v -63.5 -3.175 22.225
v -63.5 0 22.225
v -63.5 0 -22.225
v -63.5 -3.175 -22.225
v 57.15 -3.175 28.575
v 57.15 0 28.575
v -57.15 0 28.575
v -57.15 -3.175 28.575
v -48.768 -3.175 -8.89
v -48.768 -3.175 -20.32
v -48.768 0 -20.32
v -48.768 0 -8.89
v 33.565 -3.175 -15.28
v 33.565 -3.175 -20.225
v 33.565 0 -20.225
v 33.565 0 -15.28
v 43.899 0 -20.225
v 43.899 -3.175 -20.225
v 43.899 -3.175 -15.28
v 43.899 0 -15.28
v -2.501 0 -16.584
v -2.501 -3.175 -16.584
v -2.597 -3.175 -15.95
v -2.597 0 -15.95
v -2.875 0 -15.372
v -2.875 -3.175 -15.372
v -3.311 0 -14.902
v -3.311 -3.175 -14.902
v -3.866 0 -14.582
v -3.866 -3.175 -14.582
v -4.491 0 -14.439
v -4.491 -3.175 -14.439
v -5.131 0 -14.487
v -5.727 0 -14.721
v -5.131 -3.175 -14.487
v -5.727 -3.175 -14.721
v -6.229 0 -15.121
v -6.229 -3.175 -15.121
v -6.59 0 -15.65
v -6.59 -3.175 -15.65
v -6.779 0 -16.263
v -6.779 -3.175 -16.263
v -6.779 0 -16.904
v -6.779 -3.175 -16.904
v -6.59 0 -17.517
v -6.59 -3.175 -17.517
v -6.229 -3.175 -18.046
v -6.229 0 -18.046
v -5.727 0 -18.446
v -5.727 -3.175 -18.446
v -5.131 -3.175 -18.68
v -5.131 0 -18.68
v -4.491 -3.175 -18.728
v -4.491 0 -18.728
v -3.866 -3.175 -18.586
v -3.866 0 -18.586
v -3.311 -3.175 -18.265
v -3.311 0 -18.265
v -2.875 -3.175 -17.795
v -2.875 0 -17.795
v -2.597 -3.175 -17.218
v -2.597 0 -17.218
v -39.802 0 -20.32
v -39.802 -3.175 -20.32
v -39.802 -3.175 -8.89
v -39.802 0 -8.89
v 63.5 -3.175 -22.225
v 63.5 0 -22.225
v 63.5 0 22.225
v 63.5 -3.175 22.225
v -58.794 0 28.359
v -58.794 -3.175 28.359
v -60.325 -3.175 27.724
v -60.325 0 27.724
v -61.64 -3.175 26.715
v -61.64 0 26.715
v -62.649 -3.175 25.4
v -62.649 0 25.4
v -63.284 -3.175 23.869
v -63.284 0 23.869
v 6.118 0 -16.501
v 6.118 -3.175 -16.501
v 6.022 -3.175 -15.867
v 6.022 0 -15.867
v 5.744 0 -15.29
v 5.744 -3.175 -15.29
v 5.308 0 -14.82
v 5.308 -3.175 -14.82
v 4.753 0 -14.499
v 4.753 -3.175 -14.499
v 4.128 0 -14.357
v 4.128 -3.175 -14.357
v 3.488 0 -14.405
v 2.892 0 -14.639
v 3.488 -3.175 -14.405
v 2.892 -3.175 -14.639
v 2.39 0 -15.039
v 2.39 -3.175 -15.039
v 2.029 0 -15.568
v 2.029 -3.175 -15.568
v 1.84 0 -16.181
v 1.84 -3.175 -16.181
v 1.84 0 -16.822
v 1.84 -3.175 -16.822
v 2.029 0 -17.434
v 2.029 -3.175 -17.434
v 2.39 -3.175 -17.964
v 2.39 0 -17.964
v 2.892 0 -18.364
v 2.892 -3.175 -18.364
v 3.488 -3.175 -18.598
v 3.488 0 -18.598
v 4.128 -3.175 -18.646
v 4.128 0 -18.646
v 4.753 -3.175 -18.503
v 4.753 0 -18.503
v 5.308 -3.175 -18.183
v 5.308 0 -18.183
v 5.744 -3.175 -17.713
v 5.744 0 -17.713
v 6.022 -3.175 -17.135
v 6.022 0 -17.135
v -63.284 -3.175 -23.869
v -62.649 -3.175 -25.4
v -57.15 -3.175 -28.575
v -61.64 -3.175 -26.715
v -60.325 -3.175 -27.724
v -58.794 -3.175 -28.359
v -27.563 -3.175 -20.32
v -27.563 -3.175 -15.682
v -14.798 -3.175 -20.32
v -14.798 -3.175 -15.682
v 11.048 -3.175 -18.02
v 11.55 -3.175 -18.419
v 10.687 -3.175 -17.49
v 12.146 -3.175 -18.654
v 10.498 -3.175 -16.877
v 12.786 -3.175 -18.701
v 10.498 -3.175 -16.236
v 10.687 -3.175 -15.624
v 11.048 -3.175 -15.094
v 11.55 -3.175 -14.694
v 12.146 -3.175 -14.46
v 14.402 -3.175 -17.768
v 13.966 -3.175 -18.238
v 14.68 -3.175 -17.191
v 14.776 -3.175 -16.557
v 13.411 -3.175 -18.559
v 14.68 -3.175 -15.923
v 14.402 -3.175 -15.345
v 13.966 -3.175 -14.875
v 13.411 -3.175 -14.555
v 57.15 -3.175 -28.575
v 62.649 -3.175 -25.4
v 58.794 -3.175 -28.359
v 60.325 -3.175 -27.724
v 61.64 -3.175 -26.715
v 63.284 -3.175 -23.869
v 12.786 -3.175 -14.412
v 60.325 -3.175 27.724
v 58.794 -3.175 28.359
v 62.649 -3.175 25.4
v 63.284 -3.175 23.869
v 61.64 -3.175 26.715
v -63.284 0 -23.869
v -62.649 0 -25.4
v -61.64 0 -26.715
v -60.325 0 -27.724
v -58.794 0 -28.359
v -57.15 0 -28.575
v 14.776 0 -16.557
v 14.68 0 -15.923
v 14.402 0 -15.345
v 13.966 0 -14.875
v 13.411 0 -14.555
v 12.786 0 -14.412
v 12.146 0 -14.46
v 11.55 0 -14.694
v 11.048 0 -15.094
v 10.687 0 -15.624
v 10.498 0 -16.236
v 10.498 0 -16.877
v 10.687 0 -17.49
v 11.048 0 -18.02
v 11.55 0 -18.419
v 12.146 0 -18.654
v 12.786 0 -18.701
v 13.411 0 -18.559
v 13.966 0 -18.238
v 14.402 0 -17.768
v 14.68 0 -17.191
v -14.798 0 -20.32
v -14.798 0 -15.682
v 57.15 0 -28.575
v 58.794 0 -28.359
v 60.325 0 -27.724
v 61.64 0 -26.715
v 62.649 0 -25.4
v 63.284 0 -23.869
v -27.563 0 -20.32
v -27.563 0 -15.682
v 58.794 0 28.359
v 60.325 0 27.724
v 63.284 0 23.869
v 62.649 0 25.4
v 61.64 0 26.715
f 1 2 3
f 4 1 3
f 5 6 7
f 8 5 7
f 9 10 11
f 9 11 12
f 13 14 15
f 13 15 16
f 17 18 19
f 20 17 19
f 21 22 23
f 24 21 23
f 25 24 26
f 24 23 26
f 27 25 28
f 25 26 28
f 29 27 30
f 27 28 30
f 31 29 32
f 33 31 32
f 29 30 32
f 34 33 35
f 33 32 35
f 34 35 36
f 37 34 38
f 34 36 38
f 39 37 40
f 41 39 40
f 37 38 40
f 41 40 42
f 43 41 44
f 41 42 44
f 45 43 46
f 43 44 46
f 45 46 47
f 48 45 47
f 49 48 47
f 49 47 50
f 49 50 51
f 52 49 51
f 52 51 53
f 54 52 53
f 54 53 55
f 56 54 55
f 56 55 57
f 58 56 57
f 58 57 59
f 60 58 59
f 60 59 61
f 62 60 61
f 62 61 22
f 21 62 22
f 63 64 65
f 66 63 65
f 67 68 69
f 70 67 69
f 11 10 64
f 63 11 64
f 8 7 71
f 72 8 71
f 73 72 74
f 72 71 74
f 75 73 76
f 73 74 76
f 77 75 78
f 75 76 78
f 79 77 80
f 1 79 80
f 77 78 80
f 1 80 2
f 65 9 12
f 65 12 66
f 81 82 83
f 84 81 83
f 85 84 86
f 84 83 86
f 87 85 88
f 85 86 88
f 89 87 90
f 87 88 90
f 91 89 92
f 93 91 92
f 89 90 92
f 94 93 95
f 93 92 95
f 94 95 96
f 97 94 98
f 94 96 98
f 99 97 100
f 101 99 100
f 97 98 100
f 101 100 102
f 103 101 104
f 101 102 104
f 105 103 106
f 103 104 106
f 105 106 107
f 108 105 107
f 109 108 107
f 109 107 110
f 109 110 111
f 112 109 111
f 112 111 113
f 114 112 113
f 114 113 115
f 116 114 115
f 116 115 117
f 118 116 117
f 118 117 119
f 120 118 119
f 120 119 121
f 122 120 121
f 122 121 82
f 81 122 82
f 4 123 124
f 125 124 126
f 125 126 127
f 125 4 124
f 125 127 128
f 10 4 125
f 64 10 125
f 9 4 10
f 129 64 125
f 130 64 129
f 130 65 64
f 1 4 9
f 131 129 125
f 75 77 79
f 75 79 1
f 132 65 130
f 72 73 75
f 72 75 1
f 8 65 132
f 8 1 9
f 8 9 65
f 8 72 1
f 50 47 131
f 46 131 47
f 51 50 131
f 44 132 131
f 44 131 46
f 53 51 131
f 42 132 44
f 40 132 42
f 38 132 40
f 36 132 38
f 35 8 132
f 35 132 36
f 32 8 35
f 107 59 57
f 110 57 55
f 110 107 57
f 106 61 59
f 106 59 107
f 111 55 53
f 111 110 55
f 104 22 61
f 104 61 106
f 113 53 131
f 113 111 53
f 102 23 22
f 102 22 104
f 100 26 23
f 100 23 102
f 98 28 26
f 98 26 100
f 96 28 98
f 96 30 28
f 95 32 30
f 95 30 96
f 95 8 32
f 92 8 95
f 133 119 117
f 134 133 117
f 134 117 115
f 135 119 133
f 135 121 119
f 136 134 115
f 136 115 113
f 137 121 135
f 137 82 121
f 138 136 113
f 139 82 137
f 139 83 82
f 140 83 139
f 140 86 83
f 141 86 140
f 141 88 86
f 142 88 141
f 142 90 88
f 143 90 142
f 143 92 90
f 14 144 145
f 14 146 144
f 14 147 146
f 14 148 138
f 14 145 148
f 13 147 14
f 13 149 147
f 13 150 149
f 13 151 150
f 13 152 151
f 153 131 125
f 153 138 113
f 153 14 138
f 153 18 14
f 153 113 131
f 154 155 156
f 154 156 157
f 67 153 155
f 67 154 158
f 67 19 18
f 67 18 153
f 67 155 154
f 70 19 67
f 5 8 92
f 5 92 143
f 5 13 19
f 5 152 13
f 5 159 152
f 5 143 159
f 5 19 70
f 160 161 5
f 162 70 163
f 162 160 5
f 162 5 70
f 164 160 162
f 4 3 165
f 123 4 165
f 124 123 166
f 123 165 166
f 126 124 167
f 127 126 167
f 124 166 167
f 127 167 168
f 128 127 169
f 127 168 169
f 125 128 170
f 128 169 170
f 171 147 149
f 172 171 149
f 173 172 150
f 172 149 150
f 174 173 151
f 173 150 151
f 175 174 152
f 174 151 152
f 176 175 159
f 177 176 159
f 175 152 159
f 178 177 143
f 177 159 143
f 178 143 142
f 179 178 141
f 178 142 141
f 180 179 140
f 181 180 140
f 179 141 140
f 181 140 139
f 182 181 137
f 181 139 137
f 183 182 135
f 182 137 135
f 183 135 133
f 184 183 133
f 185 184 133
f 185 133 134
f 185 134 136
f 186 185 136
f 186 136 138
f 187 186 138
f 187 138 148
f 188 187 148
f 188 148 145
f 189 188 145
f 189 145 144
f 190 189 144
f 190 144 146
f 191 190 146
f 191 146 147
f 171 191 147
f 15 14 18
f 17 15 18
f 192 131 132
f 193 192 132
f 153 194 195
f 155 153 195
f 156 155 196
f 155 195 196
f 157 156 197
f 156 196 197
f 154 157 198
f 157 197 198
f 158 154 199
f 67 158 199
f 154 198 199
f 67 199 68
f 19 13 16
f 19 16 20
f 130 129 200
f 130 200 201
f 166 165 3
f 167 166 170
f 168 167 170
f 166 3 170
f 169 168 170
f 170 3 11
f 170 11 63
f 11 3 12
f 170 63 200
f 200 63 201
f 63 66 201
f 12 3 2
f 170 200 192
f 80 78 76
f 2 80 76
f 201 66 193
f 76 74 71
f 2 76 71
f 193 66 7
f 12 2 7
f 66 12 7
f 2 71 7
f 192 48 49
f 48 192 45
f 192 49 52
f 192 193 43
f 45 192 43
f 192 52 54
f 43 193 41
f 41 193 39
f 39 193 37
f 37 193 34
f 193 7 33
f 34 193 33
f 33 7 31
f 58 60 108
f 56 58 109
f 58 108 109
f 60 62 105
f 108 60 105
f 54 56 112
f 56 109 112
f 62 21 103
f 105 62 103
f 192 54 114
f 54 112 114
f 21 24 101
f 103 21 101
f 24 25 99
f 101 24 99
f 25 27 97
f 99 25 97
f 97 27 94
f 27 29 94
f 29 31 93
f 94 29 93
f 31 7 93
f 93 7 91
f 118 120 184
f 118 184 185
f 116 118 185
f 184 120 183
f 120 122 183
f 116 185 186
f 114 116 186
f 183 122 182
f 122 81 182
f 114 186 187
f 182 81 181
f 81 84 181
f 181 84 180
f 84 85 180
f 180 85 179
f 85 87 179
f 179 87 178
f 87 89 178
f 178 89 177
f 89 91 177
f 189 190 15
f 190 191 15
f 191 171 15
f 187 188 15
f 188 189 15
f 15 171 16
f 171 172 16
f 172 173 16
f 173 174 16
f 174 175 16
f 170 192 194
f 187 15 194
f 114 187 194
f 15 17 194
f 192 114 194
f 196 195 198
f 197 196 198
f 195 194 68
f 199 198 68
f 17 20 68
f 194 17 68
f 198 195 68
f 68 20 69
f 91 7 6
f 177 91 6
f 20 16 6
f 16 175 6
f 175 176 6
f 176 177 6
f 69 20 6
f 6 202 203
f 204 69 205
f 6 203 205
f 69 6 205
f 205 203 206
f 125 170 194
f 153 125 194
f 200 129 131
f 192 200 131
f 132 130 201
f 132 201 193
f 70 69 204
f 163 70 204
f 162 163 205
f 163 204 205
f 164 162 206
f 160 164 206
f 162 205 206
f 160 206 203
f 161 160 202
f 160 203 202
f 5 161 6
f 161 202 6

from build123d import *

# Parameters (mm, degrees)
F1_DEPTH = 3.175
F2_W     = 8.9662
F2_H     = 11.43
F2_W_2   = 12.764952
F2_H_2   = 4.638044
F2_R     = 2.150647
F2_W_3   = 10.33394
F2_H_3   = 4.94447
F3_DEPTH = 25.4


with BuildPart() as f1:
    # F0 (on Front) → F1 (new body)
    with BuildSketch(Plane.XZ):
        with BuildLine():
            ThreePointArc((63.5, 22.225), (61.640128, 26.715128), (57.15, 28.575))
            Line((57.15, 28.575), (-57.15, 28.575))
            ThreePointArc((-57.15, 28.575), (-61.640128, 26.715128), (-63.5, 22.225))
            Line((-63.5, 22.225), (-63.5, -22.225))
            ThreePointArc((-63.5, -22.225), (-61.640128, -26.715128), (-57.15, -28.575))
            Line((-57.15, -28.575), (57.15, -28.575))
            ThreePointArc((57.15, -28.575), (61.640128, -26.715128), (63.5, -22.225))
            Line((63.5, -22.225), (63.5, 22.225))
        make_face()
    extrude(amount=F1_DEPTH)

    # F2 (on face) → F3 (cut)
    with BuildSketch(Plane.XZ.offset(3.175)):
        with Locations((-44.2849, -14.605)):
            Rectangle(F2_W, F2_H)
        with Locations((-21.180364, -18.000978)):
            Rectangle(F2_W_2, F2_H_2)
        with Locations((-4.65206, -16.583629)):
            Circle(F2_R)
        with Locations((3.967021, -16.501367)):
            Circle(F2_R)
        with Locations((12.624987, -16.556866)):
            Circle(F2_R)
        with Locations((38.731862, -17.752491)):
            Rectangle(F2_W_3, F2_H_3)
    extrude(amount=-F3_DEPTH, mode=Mode.SUBTRACT)


solid = f1.part
